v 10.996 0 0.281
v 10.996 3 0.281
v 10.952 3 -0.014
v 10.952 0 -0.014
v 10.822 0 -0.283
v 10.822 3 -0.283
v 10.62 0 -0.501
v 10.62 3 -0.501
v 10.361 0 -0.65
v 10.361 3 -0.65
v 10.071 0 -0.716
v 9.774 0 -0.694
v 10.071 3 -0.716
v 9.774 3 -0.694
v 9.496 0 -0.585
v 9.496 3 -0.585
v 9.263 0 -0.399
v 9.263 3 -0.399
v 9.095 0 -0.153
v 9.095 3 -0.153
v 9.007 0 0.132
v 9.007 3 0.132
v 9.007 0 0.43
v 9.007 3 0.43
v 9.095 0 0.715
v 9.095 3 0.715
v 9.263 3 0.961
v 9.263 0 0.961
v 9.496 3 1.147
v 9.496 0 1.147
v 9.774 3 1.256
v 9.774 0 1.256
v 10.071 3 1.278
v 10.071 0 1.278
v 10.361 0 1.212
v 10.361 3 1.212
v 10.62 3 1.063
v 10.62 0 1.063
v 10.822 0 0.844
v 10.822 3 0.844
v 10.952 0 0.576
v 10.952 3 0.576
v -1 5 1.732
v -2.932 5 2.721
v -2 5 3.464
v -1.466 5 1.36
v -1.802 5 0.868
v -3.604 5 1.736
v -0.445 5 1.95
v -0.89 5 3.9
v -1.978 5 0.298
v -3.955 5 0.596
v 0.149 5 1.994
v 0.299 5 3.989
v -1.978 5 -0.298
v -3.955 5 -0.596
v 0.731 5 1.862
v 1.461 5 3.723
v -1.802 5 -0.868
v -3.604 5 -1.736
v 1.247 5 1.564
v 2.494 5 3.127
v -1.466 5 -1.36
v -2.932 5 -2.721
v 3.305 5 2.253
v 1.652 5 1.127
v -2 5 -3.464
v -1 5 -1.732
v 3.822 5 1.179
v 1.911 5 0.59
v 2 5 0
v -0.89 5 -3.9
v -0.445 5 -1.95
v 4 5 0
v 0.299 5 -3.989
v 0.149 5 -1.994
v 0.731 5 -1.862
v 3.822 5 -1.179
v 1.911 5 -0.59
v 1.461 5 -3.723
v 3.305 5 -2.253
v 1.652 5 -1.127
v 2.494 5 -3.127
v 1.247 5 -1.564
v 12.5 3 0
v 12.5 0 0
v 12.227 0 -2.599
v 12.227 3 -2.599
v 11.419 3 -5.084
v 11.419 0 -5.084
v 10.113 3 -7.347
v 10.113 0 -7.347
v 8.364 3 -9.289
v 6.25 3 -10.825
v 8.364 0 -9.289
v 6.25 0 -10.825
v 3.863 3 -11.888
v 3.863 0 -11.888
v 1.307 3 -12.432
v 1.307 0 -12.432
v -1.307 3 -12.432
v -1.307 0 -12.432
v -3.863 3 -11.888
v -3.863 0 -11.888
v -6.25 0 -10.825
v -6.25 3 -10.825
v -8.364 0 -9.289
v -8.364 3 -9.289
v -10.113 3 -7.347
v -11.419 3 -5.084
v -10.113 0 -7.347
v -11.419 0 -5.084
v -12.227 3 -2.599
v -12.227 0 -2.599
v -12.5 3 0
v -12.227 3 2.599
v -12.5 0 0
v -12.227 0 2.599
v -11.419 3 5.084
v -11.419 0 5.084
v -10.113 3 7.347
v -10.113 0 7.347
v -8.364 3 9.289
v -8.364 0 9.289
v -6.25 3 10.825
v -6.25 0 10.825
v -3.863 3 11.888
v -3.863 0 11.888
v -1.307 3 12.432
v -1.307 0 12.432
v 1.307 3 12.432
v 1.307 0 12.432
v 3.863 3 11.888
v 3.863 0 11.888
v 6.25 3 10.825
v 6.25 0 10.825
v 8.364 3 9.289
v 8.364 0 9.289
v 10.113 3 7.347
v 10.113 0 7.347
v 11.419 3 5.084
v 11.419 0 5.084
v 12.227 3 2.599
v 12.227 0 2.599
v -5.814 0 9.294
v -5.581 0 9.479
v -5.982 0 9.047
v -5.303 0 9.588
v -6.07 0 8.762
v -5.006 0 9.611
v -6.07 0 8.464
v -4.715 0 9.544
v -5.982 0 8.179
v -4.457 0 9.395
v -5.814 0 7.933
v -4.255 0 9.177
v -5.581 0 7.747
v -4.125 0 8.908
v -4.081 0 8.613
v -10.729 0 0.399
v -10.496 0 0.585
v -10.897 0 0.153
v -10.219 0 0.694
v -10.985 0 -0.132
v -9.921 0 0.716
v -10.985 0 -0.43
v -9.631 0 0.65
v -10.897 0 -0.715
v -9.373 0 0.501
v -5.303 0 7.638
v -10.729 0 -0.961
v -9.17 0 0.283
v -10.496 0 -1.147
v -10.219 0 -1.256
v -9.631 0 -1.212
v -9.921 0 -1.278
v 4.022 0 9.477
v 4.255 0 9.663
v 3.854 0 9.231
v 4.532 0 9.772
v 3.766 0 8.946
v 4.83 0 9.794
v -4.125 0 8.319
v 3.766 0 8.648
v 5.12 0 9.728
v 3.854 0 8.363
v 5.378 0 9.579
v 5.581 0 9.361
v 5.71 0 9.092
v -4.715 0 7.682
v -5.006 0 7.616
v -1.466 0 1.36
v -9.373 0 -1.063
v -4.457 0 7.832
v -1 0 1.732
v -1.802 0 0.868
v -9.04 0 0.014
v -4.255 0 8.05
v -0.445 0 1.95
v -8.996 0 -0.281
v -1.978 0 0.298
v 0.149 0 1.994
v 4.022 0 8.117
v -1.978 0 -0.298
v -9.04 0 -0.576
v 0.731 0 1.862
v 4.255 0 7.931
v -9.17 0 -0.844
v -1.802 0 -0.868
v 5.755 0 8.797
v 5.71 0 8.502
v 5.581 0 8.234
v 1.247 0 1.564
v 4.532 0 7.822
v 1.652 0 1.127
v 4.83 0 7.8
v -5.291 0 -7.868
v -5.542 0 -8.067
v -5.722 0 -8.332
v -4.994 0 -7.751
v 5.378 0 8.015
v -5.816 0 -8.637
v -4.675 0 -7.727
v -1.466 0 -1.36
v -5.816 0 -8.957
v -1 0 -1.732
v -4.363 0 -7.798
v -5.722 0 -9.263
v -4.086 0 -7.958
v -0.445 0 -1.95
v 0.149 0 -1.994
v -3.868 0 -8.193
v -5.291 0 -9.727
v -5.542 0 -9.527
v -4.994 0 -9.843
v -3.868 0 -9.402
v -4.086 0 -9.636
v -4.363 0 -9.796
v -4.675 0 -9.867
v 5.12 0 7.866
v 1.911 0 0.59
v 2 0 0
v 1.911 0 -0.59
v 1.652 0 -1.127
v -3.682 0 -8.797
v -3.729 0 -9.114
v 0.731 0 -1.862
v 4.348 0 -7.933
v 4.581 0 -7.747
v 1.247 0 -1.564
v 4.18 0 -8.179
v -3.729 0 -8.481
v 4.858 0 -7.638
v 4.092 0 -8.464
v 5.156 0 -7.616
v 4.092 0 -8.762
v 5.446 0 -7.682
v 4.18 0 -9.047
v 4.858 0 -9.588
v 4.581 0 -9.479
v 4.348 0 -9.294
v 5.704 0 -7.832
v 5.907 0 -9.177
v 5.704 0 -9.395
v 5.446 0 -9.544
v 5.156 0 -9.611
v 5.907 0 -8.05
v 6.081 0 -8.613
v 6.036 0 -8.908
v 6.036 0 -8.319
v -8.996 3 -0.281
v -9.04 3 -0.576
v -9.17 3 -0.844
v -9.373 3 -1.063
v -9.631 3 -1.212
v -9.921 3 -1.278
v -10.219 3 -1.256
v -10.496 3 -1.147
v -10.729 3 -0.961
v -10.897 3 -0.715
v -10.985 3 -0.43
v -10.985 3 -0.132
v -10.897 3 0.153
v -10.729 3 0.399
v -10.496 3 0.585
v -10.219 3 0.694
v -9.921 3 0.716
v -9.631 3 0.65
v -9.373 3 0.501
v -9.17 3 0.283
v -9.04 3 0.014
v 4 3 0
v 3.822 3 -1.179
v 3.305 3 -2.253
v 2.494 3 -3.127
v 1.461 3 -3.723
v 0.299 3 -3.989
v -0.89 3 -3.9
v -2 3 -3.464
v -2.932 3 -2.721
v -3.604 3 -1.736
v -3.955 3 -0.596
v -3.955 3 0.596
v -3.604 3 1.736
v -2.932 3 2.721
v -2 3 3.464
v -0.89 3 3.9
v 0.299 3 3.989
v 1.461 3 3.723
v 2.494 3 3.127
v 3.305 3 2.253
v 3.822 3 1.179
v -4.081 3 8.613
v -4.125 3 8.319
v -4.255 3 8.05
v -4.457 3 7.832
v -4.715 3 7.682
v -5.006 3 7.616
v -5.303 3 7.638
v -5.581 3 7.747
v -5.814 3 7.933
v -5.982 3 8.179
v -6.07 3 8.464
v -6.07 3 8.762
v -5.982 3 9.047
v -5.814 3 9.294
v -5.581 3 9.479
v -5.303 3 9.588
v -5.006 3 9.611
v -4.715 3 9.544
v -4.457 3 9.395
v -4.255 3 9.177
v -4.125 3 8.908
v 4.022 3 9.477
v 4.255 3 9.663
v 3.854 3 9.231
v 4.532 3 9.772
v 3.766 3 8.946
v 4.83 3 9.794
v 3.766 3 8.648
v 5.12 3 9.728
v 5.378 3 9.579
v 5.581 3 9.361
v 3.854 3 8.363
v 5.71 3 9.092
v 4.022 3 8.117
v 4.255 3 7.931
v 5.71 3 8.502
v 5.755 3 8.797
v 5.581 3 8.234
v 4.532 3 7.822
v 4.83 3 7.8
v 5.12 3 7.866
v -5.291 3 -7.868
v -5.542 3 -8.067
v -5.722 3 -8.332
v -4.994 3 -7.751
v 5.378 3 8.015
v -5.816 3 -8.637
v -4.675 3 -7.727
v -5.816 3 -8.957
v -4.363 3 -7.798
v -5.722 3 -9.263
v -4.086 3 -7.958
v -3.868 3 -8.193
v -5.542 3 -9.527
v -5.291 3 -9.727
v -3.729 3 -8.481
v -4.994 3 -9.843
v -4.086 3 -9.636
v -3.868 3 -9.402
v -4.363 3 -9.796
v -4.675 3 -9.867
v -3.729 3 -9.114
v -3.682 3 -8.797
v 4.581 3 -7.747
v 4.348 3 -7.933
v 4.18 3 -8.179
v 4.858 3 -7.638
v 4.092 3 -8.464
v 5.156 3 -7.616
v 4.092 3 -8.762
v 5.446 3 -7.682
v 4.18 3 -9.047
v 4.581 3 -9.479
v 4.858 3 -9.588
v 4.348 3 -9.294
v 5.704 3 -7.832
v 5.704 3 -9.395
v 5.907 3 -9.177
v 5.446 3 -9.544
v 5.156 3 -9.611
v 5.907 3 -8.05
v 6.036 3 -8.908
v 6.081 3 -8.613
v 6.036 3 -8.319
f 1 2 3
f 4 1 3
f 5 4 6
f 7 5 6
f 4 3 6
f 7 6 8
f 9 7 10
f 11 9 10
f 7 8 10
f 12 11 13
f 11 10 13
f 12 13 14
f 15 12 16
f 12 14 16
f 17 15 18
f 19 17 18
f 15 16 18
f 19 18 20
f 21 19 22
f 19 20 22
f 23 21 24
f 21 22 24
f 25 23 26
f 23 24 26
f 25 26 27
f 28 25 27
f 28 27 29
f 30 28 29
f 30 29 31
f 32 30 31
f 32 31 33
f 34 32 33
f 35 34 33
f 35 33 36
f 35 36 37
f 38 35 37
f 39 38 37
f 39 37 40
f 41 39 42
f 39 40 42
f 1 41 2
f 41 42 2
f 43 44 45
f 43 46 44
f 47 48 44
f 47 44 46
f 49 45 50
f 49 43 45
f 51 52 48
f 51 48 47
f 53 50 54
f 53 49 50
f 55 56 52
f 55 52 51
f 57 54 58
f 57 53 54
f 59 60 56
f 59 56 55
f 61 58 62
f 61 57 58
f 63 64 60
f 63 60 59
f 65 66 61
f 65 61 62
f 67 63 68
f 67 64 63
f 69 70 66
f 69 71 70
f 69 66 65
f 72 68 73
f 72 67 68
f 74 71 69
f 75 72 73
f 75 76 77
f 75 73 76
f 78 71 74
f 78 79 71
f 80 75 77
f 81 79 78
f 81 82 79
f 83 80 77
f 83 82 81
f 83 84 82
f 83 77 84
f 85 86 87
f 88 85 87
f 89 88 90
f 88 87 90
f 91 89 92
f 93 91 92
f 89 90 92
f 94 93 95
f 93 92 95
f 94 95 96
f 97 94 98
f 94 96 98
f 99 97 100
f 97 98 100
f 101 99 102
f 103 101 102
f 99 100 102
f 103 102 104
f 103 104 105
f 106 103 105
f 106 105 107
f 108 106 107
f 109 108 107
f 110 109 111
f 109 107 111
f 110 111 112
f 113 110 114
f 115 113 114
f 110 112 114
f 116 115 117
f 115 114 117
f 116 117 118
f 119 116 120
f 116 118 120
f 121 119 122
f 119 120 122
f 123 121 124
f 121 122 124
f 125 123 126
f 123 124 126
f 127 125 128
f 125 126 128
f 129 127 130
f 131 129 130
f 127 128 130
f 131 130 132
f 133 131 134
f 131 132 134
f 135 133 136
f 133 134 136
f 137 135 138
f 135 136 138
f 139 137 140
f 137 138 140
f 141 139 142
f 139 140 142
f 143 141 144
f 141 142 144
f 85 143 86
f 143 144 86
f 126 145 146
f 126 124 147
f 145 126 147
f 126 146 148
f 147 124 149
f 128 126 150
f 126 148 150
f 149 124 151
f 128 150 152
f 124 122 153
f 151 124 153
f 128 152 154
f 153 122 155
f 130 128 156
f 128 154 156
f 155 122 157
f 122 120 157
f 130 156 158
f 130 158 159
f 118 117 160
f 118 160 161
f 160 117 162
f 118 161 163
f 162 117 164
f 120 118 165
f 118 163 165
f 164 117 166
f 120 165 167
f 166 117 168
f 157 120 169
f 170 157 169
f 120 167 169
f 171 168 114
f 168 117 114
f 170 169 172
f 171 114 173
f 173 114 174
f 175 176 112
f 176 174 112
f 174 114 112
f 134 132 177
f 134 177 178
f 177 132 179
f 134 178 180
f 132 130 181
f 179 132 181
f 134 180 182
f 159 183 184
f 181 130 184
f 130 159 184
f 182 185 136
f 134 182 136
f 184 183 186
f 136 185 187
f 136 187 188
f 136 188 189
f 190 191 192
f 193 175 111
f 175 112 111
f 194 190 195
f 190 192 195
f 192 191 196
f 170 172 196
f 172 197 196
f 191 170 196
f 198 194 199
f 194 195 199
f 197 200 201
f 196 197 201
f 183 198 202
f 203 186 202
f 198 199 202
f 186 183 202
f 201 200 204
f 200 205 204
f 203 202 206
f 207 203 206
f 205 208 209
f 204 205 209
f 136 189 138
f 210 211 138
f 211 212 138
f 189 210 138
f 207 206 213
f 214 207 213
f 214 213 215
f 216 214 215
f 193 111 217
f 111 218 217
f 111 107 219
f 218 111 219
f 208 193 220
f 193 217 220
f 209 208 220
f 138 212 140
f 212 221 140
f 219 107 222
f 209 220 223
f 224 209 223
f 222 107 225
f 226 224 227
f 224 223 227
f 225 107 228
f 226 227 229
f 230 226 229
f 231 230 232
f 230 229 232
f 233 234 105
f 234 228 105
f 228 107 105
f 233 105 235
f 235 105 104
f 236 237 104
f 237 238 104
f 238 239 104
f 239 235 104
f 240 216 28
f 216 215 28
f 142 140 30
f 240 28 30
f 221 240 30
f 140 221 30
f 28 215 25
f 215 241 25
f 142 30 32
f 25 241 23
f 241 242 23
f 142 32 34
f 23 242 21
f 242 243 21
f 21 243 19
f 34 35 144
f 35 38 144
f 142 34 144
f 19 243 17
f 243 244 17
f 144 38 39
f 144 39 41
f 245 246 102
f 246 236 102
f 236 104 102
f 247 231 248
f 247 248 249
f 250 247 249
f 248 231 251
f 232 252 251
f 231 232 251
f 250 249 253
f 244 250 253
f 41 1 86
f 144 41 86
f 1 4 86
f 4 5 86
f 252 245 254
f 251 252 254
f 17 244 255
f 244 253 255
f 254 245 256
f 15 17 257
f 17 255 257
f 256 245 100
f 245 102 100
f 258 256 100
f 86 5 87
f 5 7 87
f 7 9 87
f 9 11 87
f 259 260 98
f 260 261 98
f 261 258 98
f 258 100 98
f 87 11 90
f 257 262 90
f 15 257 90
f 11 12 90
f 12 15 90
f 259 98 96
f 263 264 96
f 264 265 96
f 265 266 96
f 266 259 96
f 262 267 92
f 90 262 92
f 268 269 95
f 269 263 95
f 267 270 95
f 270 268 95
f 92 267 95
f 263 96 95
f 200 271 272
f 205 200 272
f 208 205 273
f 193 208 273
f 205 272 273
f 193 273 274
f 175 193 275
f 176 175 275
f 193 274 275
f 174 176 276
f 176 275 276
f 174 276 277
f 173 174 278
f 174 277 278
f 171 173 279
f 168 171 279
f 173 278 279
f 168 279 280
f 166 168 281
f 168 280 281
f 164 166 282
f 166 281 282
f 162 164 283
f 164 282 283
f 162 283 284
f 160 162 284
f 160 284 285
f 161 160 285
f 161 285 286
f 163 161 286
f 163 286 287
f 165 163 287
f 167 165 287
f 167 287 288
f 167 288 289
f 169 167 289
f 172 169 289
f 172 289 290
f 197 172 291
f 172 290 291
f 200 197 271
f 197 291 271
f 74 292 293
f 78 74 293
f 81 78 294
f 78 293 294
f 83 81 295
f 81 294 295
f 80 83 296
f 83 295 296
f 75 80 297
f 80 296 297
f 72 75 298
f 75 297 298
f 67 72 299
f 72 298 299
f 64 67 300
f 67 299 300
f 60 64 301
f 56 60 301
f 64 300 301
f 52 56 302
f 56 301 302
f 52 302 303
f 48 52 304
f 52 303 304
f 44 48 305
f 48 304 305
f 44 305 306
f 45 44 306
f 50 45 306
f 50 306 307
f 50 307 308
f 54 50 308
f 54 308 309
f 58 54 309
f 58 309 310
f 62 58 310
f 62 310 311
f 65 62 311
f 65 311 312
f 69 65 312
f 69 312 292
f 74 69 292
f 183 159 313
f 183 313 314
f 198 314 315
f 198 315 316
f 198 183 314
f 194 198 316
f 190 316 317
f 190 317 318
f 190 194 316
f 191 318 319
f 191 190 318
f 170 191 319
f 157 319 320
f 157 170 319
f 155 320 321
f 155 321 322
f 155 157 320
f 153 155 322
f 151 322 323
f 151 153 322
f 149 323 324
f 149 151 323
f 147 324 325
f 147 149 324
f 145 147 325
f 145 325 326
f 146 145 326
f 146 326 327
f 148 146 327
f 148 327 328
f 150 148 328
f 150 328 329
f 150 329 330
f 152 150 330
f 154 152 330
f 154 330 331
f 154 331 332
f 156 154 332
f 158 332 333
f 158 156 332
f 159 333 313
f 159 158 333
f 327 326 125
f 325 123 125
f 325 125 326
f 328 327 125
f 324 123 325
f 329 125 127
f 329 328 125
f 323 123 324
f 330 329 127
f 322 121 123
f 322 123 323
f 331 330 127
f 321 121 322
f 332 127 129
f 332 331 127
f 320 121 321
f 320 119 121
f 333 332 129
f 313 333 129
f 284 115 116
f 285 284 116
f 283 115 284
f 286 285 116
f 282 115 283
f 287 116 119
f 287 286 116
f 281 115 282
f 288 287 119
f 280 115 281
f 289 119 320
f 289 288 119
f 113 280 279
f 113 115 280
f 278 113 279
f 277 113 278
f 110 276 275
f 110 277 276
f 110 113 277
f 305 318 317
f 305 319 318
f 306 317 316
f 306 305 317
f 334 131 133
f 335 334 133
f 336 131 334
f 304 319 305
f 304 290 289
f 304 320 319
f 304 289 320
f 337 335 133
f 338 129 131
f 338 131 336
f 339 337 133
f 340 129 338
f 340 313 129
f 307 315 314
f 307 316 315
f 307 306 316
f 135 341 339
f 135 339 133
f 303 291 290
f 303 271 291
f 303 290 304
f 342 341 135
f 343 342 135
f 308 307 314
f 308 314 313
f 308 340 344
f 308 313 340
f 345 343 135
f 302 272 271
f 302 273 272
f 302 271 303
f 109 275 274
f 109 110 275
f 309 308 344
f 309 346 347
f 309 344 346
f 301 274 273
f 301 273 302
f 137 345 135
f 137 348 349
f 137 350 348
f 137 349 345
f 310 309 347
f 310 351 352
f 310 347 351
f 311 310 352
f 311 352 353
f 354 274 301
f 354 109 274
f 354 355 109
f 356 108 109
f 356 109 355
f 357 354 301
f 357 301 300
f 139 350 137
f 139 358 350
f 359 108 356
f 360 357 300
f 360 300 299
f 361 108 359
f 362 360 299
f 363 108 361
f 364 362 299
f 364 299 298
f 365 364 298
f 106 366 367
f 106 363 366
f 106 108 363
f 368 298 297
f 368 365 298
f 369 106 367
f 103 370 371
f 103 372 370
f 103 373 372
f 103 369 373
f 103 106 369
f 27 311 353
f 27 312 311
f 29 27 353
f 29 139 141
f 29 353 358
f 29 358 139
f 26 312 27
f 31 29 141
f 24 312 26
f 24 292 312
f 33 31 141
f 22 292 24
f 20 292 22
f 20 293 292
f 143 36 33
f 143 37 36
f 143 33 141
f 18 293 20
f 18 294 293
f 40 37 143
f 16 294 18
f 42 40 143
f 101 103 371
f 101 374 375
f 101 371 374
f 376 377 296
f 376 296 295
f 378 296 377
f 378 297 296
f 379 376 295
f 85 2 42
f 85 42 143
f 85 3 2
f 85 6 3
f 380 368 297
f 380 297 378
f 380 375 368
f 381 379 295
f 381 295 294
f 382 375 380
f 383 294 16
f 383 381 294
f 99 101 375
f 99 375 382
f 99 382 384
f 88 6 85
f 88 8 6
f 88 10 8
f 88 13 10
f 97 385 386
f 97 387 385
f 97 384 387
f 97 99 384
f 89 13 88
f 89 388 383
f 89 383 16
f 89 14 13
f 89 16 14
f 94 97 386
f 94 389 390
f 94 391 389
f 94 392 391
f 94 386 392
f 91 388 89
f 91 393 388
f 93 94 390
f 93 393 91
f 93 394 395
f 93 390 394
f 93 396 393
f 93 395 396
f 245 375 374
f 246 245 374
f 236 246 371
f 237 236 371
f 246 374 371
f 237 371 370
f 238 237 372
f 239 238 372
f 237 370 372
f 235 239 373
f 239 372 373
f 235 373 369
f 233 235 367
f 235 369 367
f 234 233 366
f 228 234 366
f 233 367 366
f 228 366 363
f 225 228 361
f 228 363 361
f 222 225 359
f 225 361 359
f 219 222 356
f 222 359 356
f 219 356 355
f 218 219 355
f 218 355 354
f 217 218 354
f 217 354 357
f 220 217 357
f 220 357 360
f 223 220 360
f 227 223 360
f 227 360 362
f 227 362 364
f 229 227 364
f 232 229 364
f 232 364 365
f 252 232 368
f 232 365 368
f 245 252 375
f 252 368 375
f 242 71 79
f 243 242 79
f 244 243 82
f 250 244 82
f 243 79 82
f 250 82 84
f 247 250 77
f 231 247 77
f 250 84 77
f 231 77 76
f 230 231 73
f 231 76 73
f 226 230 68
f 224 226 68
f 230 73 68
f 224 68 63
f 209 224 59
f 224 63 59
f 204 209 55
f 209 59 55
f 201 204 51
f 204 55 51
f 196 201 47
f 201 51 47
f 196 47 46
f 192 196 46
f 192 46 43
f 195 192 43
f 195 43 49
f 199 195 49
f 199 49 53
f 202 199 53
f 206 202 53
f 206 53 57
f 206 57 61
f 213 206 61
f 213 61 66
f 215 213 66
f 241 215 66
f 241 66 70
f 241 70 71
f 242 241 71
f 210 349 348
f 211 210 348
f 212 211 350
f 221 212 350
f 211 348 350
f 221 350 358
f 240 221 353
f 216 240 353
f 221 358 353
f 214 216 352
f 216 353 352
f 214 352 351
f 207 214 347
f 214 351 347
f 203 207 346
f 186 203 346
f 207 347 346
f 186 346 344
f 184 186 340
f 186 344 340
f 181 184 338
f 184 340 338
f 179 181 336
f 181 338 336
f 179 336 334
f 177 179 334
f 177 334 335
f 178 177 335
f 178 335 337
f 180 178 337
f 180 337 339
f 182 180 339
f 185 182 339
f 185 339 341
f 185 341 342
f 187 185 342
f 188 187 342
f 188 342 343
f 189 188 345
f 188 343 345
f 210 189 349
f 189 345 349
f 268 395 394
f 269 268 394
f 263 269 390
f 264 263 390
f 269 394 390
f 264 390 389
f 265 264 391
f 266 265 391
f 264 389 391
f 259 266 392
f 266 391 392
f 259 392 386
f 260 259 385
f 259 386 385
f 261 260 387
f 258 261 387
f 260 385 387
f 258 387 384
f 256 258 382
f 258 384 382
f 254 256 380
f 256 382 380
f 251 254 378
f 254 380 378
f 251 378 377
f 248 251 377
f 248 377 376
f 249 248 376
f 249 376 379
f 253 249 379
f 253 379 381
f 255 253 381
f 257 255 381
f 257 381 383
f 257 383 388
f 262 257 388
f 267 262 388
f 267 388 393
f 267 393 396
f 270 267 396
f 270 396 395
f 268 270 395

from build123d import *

# Parameters (mm, degrees)
SKETCH1_R           = 12.5
BOSS_EXTRUDE1_DEPTH = 3
SKETCH2_R           = 4
BOSS_EXTRUDE2_DEPTH = 5
SKETCH5_R           = 2
CUT_EXTRUDE3_DEPTH  = 8
SKETCH4_R           = 1
CUT_EXTRUDE4_DEPTH  = 8
SKETCH3_R           = 1
CUT_EXTRUDE7_DEPTH  = 3
SKETCH11_R          = 1.073090014
SKETCH11_R_2        = 1
CUT_EXTRUDE9_DEPTH  = 3


with BuildPart() as part:
    # Sketch1 → Boss-Extrude1 (new body)
    with BuildSketch(Plane(origin=(0, 0, 0), x_dir=(1, 0, 0), z_dir=(0, 1, 0))):
        Circle(SKETCH1_R)
    extrude(amount=BOSS_EXTRUDE1_DEPTH)

    # Sketch2 → Boss-Extrude2 (add)
    with BuildSketch(Plane(origin=(0, 0, 0), x_dir=(1, 0, 0), z_dir=(0, 1, 0))):
        Circle(SKETCH2_R)
    extrude(amount=BOSS_EXTRUDE2_DEPTH)

    # Sketch5 → Cut-Extrude3 (cut)
    with BuildSketch(Plane(origin=(0, 5, 0), x_dir=(1, 0, 0), z_dir=(0, 1, 0))):
        Circle(SKETCH5_R)
    extrude(amount=-CUT_EXTRUDE3_DEPTH, mode=Mode.SUBTRACT)

    # Sketch4 → Cut-Extrude4 (cut)
    with BuildSketch(Plane(origin=(0, 3, 0), x_dir=(1, 0, 0), z_dir=(0, 1, 0))):
        with Locations((5.080770429, 8.613345791)):
            Circle(SKETCH4_R)
    extrude(amount=-CUT_EXTRUDE4_DEPTH, mode=Mode.SUBTRACT)

    # Sketch3 → Cut-Extrude7 (cut)
    with BuildSketch(Plane(origin=(0, 0, 0), x_dir=(1, 0, 0), z_dir=(0, 1, 0))):
        with Locations((-5.080770429, -8.613345791)):
            Circle(SKETCH3_R)
    extrude(amount=CUT_EXTRUDE7_DEPTH, mode=Mode.SUBTRACT)

    # Sketch11 → Cut-Extrude9 (cut)
    with BuildSketch(Plane(origin=(0, 3, 0), x_dir=(1, 0, 0), z_dir=(0, 1, 0))):
        with Locations((-4.754881291, 8.797221374)):
            Circle(SKETCH11_R)
        with Locations((-9.996057838, 0.280762697)):
            Circle(SKETCH11_R_2)
        with Locations((4.754881291, -8.797221374)):
            Circle(SKETCH11_R_2)
        with Locations((9.996057838, -0.280762697)):
            Circle(SKETCH11_R_2)
    extrude(amount=-CUT_EXTRUDE9_DEPTH, mode=Mode.SUBTRACT)


solid = part.part
